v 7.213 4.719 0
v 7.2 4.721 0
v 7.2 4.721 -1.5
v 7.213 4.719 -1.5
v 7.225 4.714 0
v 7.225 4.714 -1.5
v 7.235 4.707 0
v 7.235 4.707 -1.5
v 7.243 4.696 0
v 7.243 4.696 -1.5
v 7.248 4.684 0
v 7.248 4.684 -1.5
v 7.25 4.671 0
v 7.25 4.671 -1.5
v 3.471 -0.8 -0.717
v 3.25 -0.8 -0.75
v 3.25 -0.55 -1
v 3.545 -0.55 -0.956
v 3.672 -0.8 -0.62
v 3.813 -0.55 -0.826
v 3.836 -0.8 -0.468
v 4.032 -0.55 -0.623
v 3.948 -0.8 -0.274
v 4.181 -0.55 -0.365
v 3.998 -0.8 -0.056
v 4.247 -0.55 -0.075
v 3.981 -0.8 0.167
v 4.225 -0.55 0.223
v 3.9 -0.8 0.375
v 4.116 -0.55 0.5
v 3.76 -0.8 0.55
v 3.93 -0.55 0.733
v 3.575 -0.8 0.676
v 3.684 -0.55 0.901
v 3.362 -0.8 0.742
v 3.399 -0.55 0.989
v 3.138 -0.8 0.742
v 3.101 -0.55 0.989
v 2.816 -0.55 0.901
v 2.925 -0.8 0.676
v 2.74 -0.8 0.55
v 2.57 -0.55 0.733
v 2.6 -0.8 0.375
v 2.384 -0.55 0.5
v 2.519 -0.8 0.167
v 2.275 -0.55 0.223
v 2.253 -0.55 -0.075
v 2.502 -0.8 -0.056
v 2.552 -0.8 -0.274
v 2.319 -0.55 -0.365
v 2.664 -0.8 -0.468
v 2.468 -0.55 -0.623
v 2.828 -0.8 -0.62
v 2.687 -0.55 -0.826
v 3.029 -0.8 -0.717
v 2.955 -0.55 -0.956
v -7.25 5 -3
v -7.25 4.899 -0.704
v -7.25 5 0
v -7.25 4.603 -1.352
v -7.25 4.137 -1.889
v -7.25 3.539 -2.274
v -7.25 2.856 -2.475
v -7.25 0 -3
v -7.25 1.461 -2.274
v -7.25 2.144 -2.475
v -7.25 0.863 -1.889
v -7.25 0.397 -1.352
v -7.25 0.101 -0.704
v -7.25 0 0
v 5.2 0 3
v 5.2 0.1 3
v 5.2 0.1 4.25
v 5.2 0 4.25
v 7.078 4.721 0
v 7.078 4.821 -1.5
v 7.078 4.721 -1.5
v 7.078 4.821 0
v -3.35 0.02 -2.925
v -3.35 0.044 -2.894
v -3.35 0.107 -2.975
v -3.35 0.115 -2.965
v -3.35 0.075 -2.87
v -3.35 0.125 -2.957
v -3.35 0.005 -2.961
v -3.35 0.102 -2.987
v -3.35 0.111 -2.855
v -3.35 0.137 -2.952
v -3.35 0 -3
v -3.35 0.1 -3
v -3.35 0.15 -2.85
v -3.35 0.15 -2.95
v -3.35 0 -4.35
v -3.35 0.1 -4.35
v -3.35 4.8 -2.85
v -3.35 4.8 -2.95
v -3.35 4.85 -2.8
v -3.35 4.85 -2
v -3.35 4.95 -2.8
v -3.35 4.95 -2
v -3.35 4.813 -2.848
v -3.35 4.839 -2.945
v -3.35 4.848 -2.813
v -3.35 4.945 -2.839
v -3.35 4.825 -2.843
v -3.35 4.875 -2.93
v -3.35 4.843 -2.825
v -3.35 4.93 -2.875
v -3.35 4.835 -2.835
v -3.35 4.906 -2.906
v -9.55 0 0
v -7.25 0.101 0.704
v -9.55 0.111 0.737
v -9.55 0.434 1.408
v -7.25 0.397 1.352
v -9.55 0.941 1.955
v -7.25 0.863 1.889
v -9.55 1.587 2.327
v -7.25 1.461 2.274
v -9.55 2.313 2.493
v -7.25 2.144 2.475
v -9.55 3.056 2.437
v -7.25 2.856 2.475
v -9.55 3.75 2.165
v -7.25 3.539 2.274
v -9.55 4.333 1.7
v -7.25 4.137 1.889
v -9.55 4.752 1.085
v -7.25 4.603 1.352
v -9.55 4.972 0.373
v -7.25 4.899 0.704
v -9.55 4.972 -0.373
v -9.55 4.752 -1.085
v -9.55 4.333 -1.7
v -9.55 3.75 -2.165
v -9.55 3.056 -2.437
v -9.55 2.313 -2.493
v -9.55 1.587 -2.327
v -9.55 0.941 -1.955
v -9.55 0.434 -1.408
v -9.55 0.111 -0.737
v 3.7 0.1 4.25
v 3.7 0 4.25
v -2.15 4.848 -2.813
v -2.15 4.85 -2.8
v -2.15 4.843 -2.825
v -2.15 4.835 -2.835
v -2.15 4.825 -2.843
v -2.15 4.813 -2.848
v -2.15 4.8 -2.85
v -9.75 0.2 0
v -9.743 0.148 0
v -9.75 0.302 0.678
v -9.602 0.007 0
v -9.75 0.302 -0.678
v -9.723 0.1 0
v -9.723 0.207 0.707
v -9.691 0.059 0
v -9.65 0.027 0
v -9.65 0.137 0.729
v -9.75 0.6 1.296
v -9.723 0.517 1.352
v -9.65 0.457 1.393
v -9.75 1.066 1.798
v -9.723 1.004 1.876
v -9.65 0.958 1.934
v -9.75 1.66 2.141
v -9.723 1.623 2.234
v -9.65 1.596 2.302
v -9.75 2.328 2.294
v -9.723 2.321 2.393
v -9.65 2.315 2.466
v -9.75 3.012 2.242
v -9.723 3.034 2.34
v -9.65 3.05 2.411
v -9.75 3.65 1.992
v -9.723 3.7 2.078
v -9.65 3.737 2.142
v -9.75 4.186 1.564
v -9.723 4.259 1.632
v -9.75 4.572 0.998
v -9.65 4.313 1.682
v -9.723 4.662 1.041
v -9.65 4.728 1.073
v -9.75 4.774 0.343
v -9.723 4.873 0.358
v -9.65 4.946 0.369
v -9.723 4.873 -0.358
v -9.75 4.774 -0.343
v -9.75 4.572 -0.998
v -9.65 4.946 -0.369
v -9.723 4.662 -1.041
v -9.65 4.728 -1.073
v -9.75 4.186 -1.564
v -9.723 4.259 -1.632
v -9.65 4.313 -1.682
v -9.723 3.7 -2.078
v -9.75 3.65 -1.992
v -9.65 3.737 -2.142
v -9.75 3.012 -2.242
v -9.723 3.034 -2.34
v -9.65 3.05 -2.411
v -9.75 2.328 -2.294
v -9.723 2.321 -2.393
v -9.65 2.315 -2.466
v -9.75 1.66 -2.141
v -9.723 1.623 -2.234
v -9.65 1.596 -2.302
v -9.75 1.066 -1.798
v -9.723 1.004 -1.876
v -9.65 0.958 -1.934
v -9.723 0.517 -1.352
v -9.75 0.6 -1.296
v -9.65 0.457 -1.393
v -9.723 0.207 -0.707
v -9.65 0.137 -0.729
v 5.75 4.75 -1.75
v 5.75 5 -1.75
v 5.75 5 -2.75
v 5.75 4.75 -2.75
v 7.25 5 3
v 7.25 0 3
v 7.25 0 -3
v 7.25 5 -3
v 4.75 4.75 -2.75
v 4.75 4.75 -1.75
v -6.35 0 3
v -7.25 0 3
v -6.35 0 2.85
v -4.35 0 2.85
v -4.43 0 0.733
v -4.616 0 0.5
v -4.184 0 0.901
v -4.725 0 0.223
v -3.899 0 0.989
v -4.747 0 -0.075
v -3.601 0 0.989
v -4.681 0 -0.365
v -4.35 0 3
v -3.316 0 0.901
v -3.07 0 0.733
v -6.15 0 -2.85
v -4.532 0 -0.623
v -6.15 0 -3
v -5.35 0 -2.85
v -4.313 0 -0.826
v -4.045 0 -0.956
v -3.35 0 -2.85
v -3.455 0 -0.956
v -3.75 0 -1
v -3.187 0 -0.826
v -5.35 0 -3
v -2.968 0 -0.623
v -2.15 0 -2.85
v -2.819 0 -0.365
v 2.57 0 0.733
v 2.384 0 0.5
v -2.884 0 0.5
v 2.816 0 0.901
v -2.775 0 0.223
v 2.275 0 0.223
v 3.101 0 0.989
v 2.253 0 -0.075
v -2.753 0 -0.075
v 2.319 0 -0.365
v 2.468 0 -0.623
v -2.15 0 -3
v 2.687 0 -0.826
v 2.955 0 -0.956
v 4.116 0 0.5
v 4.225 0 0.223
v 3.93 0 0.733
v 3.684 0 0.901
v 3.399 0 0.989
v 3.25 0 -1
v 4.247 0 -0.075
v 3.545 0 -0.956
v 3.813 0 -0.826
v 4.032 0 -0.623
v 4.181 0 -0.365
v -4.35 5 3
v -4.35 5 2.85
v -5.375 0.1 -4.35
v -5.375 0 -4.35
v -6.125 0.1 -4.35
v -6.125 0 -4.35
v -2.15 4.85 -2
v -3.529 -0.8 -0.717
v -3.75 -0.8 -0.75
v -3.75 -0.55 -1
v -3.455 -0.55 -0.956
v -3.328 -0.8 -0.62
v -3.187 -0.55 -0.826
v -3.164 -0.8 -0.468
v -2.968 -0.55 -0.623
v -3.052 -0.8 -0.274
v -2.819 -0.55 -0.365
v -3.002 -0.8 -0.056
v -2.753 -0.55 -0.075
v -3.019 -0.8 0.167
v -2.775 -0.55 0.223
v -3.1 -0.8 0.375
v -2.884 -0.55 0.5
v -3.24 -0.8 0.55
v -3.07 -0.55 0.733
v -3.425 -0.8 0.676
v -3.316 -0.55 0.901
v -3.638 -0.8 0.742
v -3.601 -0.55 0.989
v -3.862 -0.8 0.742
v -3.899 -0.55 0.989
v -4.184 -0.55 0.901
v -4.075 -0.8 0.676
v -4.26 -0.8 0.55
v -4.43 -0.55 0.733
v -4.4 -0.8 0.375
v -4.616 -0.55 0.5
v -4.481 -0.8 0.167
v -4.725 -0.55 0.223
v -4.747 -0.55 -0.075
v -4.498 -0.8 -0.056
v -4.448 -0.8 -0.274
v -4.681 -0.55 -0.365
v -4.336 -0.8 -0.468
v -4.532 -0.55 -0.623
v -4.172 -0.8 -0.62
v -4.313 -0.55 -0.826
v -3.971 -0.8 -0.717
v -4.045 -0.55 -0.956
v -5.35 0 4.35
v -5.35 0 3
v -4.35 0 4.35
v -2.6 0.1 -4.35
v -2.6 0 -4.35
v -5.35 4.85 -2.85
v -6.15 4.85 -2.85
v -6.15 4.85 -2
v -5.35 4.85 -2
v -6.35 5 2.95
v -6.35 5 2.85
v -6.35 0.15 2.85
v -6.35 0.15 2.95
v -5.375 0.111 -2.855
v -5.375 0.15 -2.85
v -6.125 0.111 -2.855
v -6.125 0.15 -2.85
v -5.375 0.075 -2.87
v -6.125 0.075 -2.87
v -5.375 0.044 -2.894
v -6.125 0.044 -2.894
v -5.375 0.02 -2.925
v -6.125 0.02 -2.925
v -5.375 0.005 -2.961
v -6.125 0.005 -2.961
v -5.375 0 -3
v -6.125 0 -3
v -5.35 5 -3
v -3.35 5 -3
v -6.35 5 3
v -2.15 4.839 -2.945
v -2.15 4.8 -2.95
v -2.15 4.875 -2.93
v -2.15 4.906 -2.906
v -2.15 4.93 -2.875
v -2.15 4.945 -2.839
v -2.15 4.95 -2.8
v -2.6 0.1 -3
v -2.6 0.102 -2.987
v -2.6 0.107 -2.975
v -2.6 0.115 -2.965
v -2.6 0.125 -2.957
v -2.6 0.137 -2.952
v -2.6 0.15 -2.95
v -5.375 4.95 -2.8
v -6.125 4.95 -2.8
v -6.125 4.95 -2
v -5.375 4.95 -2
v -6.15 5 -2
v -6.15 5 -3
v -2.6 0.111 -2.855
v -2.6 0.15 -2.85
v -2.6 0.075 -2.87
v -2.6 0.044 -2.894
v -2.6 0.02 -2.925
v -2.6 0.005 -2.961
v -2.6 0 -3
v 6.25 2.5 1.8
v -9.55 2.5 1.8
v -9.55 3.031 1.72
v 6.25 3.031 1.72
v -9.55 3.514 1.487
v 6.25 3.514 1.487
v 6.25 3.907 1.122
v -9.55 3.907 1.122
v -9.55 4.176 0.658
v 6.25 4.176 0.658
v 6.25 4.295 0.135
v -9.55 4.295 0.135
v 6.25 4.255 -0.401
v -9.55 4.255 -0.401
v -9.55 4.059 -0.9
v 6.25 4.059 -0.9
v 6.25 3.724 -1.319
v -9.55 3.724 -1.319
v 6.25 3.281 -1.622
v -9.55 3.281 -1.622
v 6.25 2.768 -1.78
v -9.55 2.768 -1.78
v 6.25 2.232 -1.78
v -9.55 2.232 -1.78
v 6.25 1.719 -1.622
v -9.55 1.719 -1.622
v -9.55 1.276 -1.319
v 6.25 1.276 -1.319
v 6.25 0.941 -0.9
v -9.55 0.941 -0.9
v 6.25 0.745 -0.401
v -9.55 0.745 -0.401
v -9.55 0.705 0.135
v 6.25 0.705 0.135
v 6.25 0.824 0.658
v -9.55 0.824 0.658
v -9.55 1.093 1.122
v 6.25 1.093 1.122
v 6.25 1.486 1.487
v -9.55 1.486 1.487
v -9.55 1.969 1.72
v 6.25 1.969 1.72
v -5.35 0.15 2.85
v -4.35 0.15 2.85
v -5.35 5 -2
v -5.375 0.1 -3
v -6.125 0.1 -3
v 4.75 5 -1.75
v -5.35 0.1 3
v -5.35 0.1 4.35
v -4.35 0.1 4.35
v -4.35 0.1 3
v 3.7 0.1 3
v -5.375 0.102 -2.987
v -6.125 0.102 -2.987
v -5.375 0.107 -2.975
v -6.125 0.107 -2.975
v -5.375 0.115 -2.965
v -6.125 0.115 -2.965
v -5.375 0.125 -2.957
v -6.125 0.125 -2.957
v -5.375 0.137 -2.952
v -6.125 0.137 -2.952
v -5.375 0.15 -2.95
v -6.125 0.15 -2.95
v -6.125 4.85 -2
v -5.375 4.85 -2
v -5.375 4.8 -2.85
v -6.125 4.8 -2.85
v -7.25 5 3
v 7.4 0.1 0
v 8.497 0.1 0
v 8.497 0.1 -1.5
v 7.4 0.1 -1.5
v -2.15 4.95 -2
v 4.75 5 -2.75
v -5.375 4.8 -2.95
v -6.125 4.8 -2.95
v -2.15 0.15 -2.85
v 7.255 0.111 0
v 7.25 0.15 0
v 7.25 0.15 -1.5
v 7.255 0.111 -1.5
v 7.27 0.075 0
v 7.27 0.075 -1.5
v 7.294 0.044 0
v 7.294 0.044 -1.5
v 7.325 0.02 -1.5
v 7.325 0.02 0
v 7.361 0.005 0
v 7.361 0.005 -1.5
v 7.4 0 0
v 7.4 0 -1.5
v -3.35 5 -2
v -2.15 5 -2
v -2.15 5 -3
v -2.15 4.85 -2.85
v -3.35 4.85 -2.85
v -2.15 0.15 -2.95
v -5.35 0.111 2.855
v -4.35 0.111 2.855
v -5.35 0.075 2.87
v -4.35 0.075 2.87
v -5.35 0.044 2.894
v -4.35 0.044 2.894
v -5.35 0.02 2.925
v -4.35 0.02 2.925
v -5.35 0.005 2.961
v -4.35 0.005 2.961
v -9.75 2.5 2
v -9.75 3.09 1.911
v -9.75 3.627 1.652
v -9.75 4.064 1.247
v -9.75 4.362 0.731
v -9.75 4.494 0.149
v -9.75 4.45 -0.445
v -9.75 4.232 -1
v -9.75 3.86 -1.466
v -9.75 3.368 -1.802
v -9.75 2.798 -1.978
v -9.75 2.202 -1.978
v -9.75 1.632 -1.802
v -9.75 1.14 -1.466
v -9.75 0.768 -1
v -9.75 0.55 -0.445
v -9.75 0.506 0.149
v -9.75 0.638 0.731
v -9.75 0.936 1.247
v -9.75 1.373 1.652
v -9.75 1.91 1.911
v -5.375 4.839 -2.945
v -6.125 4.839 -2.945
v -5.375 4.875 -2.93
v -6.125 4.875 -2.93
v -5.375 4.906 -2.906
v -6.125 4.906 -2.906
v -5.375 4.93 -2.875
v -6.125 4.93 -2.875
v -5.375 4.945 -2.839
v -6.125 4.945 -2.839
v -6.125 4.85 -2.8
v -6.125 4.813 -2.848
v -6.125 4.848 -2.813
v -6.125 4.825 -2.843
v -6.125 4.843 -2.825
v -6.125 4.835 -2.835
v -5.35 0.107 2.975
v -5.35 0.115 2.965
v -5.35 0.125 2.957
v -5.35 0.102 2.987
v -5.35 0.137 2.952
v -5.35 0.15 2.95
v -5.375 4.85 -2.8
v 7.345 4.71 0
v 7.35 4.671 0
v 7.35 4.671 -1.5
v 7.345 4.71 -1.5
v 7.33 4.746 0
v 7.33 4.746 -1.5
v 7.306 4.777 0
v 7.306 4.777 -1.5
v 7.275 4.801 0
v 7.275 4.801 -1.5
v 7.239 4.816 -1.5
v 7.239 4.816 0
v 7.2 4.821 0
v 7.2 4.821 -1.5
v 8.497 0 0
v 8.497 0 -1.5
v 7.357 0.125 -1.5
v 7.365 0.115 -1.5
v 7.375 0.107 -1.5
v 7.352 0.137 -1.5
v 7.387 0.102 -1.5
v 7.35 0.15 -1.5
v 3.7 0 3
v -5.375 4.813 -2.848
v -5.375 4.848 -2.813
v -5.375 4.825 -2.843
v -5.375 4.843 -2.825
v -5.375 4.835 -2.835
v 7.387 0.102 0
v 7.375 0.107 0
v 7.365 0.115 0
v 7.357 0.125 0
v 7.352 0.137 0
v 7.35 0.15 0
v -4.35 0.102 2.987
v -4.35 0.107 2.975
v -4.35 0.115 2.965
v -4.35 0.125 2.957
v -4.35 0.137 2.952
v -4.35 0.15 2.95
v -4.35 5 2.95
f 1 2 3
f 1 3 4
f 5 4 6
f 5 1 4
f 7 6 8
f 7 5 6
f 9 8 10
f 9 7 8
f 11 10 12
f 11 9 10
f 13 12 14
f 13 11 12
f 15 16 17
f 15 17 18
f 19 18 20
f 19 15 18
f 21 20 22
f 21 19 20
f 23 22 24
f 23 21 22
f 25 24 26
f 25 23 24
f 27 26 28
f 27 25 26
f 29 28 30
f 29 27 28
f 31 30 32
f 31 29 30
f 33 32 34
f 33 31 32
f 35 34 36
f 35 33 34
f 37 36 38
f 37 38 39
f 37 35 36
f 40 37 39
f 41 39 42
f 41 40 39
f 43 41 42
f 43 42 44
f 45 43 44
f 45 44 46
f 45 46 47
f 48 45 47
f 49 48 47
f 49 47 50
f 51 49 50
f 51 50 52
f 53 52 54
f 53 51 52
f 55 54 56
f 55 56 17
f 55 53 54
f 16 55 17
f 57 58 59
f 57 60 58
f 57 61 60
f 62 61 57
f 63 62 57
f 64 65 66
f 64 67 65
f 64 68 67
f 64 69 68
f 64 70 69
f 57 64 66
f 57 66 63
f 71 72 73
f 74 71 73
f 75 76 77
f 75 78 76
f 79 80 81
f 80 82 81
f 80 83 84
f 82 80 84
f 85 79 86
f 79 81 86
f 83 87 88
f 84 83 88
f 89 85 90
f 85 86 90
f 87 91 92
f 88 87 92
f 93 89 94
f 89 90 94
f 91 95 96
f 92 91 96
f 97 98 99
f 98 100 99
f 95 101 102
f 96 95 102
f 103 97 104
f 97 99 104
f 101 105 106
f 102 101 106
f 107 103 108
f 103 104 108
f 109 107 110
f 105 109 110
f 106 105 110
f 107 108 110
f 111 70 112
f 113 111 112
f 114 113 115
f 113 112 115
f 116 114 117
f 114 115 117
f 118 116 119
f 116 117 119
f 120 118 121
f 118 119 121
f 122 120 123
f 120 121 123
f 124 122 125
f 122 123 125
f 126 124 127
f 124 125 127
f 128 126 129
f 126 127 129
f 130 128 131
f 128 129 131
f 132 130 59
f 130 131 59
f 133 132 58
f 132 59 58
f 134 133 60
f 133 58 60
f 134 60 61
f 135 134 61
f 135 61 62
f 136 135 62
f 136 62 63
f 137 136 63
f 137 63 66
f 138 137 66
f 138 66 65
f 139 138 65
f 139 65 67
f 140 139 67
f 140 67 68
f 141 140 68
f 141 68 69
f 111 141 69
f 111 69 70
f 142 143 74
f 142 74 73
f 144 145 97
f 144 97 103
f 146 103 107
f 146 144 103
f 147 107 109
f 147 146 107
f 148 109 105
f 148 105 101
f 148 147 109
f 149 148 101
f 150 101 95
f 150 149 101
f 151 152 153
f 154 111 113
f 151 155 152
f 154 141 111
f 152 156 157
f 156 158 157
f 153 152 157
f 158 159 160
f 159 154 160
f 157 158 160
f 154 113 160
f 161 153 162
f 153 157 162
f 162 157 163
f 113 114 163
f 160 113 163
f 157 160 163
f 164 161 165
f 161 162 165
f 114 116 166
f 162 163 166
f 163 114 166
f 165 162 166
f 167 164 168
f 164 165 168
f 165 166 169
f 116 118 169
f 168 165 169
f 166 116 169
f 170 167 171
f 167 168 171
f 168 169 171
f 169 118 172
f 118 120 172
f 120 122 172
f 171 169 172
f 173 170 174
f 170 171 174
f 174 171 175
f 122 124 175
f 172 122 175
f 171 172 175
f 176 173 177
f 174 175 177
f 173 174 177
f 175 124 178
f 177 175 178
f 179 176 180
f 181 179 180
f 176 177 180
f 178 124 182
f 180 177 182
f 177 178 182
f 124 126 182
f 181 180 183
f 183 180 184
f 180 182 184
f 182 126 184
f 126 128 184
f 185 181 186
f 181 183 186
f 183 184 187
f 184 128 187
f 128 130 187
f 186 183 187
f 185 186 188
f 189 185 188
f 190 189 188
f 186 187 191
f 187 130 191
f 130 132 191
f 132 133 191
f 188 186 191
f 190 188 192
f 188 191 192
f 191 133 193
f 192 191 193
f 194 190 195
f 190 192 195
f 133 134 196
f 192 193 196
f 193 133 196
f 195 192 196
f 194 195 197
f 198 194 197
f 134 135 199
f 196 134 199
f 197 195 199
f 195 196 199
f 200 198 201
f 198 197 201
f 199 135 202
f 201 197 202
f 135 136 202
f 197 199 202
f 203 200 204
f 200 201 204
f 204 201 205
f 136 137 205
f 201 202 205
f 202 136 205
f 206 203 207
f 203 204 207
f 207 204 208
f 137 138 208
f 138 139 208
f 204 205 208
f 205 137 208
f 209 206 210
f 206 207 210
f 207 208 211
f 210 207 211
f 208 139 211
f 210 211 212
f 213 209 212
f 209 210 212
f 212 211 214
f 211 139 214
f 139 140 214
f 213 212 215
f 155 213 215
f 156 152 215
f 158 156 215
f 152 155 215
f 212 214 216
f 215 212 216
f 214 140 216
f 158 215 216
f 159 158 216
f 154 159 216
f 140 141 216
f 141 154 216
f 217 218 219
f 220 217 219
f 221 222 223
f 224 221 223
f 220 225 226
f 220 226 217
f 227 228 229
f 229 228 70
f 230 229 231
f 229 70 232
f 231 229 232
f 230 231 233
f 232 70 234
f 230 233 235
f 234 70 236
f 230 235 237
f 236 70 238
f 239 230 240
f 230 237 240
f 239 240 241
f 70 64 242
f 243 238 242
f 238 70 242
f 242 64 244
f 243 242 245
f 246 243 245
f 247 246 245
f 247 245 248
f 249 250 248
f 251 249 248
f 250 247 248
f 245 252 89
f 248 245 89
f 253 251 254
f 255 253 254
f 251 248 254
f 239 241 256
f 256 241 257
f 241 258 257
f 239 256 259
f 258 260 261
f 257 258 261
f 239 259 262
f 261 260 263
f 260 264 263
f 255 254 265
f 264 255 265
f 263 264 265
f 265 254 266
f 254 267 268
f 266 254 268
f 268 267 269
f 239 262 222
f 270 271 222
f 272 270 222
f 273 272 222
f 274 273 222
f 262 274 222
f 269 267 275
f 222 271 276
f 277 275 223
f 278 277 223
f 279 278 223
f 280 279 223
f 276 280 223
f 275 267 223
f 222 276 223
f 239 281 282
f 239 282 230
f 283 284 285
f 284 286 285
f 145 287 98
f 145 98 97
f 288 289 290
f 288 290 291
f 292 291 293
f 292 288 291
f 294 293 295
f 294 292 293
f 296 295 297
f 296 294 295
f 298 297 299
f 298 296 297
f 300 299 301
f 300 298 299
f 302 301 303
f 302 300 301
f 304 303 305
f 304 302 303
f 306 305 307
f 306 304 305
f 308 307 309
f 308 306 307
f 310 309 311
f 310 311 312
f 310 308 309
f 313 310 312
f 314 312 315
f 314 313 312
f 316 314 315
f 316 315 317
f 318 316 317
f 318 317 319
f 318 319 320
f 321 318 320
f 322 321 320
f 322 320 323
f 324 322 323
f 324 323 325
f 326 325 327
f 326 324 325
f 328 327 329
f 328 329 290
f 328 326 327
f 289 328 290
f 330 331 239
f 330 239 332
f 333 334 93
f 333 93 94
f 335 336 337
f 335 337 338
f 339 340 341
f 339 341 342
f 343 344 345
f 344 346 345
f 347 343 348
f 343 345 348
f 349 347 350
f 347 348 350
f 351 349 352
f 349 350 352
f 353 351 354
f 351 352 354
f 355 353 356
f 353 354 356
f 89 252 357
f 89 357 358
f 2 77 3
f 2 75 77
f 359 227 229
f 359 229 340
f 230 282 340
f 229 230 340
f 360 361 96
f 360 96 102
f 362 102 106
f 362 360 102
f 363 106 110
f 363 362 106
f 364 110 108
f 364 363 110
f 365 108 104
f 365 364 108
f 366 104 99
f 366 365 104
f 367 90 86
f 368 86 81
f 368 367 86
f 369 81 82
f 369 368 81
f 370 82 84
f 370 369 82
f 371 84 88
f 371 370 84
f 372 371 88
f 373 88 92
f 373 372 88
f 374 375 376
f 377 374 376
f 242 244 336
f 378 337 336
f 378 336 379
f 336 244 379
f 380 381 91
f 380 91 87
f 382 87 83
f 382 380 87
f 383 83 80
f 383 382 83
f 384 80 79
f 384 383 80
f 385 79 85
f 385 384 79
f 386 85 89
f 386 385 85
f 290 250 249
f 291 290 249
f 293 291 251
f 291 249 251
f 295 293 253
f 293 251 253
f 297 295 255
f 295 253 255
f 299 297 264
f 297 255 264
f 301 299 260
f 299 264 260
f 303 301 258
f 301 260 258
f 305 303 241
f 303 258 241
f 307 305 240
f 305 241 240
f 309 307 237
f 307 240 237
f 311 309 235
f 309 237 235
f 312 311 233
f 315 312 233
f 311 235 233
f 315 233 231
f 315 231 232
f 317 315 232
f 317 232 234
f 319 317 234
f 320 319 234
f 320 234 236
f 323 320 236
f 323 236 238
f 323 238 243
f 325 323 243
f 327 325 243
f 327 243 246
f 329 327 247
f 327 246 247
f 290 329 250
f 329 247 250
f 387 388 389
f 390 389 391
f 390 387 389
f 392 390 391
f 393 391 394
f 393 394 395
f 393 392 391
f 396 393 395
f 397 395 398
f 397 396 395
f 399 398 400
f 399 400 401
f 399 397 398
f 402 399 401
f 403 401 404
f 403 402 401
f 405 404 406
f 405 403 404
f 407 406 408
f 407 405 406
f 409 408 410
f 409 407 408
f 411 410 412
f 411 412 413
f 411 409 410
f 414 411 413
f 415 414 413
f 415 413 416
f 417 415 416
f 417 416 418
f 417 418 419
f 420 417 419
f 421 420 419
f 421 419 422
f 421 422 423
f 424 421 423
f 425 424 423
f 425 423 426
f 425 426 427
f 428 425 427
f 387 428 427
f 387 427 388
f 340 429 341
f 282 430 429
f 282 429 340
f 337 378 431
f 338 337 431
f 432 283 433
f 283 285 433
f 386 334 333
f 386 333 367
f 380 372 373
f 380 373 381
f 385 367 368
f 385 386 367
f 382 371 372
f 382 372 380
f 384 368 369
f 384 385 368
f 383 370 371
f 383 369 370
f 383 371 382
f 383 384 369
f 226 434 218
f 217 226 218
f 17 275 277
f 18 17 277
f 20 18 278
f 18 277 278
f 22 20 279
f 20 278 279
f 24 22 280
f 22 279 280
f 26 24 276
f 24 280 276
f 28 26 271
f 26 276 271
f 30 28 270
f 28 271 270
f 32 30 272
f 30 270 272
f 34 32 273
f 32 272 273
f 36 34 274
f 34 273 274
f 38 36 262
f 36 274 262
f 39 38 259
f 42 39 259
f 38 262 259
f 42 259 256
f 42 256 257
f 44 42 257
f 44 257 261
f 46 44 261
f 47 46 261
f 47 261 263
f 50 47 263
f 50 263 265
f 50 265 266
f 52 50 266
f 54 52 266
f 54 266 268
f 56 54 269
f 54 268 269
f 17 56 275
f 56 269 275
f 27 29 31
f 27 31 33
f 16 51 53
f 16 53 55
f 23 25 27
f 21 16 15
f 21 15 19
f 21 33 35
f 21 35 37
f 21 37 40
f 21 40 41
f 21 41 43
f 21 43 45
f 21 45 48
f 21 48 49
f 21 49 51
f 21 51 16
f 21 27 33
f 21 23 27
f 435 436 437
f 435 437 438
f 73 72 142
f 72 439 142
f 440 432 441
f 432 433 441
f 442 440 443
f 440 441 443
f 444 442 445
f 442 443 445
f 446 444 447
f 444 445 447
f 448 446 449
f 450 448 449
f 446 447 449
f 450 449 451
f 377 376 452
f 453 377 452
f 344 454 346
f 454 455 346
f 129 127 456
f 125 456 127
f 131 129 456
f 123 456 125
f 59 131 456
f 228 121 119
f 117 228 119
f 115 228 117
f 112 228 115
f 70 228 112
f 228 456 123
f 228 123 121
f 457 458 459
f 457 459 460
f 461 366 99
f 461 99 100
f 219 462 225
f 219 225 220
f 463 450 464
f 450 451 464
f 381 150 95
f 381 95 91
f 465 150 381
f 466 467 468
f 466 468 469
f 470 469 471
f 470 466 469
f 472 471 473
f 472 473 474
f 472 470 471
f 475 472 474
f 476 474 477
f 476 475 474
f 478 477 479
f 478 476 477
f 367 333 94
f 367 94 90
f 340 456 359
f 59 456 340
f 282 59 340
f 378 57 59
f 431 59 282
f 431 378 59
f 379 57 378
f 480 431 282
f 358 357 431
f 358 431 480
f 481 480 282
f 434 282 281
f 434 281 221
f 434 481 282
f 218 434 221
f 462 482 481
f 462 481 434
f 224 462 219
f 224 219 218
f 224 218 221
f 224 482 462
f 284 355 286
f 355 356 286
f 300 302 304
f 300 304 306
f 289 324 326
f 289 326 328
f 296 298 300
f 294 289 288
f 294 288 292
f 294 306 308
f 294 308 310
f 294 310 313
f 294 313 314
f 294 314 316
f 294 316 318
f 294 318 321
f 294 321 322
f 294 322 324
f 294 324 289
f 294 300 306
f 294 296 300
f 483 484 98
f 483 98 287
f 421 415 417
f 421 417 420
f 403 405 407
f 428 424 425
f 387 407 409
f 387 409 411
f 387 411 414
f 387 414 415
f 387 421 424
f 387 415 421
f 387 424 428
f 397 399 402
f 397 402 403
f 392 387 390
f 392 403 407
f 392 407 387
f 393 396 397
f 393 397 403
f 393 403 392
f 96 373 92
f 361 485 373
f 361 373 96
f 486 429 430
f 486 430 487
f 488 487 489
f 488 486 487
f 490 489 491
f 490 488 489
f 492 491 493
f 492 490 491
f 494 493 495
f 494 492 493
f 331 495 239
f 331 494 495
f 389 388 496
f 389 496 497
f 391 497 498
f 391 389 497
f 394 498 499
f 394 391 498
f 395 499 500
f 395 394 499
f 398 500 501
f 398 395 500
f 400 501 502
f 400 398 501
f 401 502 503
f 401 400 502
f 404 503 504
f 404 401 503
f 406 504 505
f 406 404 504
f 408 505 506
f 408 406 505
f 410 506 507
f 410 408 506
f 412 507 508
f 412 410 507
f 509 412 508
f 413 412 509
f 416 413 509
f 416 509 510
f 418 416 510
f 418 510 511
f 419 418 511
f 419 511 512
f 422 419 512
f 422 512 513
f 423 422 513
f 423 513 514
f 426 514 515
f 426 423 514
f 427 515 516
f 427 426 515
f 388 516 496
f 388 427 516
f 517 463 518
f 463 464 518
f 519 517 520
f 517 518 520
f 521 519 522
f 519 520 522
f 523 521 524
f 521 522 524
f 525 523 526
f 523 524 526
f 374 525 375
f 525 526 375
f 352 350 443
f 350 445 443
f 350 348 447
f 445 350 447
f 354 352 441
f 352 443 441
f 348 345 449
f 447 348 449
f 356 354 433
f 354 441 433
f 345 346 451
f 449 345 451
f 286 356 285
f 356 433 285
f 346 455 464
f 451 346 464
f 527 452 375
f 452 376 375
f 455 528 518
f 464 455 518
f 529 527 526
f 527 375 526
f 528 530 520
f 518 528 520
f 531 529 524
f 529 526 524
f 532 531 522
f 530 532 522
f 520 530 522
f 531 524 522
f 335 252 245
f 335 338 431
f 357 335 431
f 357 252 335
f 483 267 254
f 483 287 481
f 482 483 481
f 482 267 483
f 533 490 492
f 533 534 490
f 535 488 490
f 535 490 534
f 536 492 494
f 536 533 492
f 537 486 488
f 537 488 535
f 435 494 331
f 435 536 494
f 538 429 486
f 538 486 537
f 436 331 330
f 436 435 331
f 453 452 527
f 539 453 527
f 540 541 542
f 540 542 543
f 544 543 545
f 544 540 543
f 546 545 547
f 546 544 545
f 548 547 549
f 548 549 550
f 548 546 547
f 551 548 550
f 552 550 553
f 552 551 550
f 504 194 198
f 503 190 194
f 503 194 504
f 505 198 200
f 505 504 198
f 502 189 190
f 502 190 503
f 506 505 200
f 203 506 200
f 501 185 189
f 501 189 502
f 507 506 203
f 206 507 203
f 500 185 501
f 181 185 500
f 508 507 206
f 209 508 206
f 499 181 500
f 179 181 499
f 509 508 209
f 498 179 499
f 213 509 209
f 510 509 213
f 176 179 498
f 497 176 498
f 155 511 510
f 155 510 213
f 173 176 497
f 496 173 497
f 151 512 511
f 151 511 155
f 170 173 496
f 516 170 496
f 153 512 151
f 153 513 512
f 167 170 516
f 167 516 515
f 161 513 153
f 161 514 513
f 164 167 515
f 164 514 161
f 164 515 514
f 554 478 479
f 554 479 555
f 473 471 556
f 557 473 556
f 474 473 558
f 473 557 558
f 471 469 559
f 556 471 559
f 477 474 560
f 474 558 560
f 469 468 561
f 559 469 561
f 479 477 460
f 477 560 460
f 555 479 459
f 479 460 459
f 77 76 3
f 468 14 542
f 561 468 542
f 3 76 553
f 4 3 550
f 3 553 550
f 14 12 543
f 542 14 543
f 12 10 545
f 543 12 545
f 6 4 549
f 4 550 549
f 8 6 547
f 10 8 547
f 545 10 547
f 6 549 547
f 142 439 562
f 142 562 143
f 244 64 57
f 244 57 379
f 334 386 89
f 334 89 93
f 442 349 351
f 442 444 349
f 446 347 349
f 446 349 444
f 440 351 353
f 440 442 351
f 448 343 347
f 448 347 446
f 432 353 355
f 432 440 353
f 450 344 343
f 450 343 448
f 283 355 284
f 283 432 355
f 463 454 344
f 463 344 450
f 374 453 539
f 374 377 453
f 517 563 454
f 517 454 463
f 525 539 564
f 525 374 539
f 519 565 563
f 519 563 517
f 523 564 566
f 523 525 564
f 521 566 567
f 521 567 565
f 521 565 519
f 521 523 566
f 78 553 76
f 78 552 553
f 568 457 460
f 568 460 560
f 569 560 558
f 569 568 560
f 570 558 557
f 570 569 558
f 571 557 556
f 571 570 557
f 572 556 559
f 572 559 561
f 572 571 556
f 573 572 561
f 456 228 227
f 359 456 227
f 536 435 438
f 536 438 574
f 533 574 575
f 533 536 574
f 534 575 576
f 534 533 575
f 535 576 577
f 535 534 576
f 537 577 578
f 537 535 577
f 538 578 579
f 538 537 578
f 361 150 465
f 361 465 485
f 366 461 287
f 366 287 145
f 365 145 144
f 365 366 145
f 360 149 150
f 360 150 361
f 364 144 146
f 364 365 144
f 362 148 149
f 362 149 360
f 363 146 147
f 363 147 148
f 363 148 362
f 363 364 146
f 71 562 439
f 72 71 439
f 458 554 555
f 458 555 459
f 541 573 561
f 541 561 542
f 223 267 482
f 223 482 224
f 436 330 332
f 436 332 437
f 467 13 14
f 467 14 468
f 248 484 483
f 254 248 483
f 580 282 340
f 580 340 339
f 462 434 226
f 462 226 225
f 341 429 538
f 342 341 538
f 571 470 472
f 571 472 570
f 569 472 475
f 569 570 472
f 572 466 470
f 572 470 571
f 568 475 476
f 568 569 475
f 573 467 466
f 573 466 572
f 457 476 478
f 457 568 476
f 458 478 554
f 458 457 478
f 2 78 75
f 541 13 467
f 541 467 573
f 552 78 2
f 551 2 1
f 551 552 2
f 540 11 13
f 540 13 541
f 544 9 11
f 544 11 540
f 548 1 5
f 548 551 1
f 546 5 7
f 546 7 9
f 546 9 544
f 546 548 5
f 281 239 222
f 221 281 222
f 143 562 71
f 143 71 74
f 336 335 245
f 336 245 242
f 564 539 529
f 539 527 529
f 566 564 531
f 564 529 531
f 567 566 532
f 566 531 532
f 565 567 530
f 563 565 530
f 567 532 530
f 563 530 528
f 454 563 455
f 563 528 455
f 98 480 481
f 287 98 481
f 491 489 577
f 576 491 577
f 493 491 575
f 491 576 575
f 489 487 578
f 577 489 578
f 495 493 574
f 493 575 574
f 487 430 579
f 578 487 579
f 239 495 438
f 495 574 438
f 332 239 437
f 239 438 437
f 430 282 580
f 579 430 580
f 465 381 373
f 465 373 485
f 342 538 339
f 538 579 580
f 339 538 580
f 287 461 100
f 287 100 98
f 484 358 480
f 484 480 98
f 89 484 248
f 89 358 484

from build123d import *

# Parameters (mm, degrees)
SKETCH1_W               = 14.5
SKETCH1_H               = 6
BOSS_EXTRUDE1_DEPTH     = 5
SKETCH2_R               = 2.5
SKETCH2_R_2             = 1.8
BOSS_EXTRUDE2_DEPTH     = 2.5
CUT_EXTRUDE1_START      = -13.5
SKETCH2_2_R             = 1.8
CUT_EXTRUDE1_DEPTH      = 13.5
SKETCH3_W               = 1
SKETCH3_H               = 1
CUT_EXTRUDE2_DEPTH      = 0.25
BASE_FLANGE1_DEPTH      = 0.75
SKETCH9_W               = 1.25
SKETCH9_H               = 0.1
BASE_FLANGE2_DEPTH      = 0.75
CUT_EXTRUDE3_DEPTH      = 0.15
BASE_FLANGE3_DEPTH      = 0.5
SKETCH17_W              = 0.1
SKETCH17_H              = 4.85
BOSS_EXTRUDE3_DEPTH     = 1
SKETCH20_W              = 0.8
SKETCH20_H              = 1
CUT_EXTRUDE4_DEPTH      = 0.15
SKETCH21_W              = 0.8
SKETCH21_H              = 5
CUT_EXTRUDE5_DEPTH      = 0.15
BASE_FLANGE4_DEPTH      = 0.375
CUT_EXTRUDE6_DEPTH      = 0.15
SKETCH27_W              = 1.2
SKETCH27_H              = 1
CUT_EXTRUDE7_DEPTH      = 0.15
BASE_FLANGE5_DEPTH      = 0.4
BASE_FLANGE5_DEPTH_BACK = 0.8
SKETCH31_W              = 0.45
SKETCH31_H              = 1.5
CUT_EXTRUDE8_DEPTH      = 0.15
CHAMFER1_SIZE           = 0.2
FILLET1_R               = 0.2
SKETCH33_R              = 1
BOSS_EXTRUDE4_DEPTH     = 0.8
CHAMFER2_SIZE           = 0.25


# Sheet-metal steps are written as plain solids
with BuildPart() as part:
    # Sketch1 → Boss-Extrude1 (new body)
    with BuildSketch(Plane(origin=(0, 0, 0), x_dir=(1, 0, 0), z_dir=(0, 1, 0))):
        Rectangle(SKETCH1_W, SKETCH1_H)
    extrude(amount=BOSS_EXTRUDE1_DEPTH)

    # Sketch2 → Boss-Extrude2 (add)
    with BuildSketch(Plane.ZY.offset(7.25)):
        with Locations(Location((0, 2.5, 0), (0, 0, 270))):
            Circle(SKETCH2_R)
        with Locations((0, 2.5)):
            Circle(SKETCH2_R_2, mode=Mode.SUBTRACT)
    extrude(amount=BOSS_EXTRUDE2_DEPTH)

    # Sketch2<2> → Cut-Extrude1 (cut)
    with BuildSketch(Plane.ZY.offset(7.25).offset(CUT_EXTRUDE1_START)):
        with Locations((0, 2.5)):
            Circle(SKETCH2_2_R)
    extrude(amount=CUT_EXTRUDE1_DEPTH, mode=Mode.SUBTRACT)

    # Sketch3 → Cut-Extrude2 (cut)
    with BuildSketch(Plane(origin=(0, 5, 0), x_dir=(1, 0, 0), z_dir=(0, 1, 0))):
        with Locations((5.25, 2.25)):
            Rectangle(SKETCH3_W, SKETCH3_H)
    extrude(amount=-CUT_EXTRUDE2_DEPTH, mode=Mode.SUBTRACT)

    # Sketch13 → Cut-Extrude3 (cut)
    with BuildSketch(Plane.XY.offset(3)):
        Polygon((-6.35, 5), (-4.85, 5), (-4.35, 5), (-4.35, 0), (-4.85, 0), (-6.35, 0), align=None)
    extrude(amount=-CUT_EXTRUDE3_DEPTH, mode=Mode.SUBTRACT)

    # Sketch20 → Cut-Extrude4 (cut)
    with BuildSketch(Plane(origin=(0, 5, 0), x_dir=(1, 0, 0), z_dir=(0, 1, 0))):
        with Locations((-5.75, 2.5)):
            Rectangle(SKETCH20_W, SKETCH20_H)
    extrude(amount=-CUT_EXTRUDE4_DEPTH, mode=Mode.SUBTRACT)

    # Sketch21 → Cut-Extrude5 (cut)
    with BuildSketch(Plane(origin=(0, 0, -3), x_dir=(-1, 0, 0), z_dir=(0, 0, -1))):
        with Locations((5.75, 2.5)):
            Rectangle(SKETCH21_W, SKETCH21_H)
    extrude(amount=-CUT_EXTRUDE5_DEPTH, mode=Mode.SUBTRACT)

    # Sketch26 → Cut-Extrude6 (cut)
    with BuildSketch(Plane(origin=(0, 0, -3), x_dir=(-1, 0, 0), z_dir=(0, 0, -1))):
        Polygon((2.95, 5), (3.35, 5), (3.35, 0), (2.95, 0), (2.15, 0), (2.15, 5), align=None)
    extrude(amount=-CUT_EXTRUDE6_DEPTH, mode=Mode.SUBTRACT)

    # Sketch27 → Cut-Extrude7 (cut)
    with BuildSketch(Plane(origin=(0, 5, 0), x_dir=(1, 0, 0), z_dir=(0, 1, 0))):
        with Locations((-2.75, 2.5)):
            Rectangle(SKETCH27_W, SKETCH27_H)
    extrude(amount=-CUT_EXTRUDE7_DEPTH, mode=Mode.SUBTRACT)

    # Chamfer1
    chamfer1_edges = [part.edges().sort_by_distance(p)[0] for p in [
        (-9.75, 2.5, -1.8),
    ]]
    chamfer(chamfer1_edges, length=CHAMFER1_SIZE)

    # Fillet1
    fillet1_edges = [part.edges().sort_by_distance(p)[0] for p in [
        (-9.75, 5, 0),
    ]]
    fillet(fillet1_edges, radius=FILLET1_R)

    # Sketch33 → Boss-Extrude4 (add)
    with BuildSketch(Plane.XZ):
        with Locations(Location((-3.75, 0, 0), (0, 0, 270))):
            Circle(SKETCH33_R)
        with Locations(Location((3.25, 0, 0), (0, 0, 270))):
            Circle(SKETCH33_R)
    extrude(amount=BOSS_EXTRUDE4_DEPTH)

    # Chamfer2
    chamfer2_edges = [part.edges().sort_by_distance(p)[0] for p in [
        (-3.75, -0.8, 1),
        (3.25, -0.8, 1),
    ]]
    chamfer(chamfer2_edges, length=CHAMFER2_SIZE)


with BuildPart() as body_2:
    # Sketch4 → Base-Flange1 (new, symmetric)
    with BuildSketch(Plane.XY.offset(-0.75)):
        with BuildLine():
            Line((7.077702631, 4.721178133), (7.2, 4.721178133))
            ThreePointArc((7.2, 4.721178133), (7.235355339, 4.706533472), (7.25, 4.671178133))
            Line((7.25, 4.671178133), (7.25, 0.15))
            ThreePointArc((7.25, 0.15), (7.293933983, 0.043933983), (7.4, 0))
            Line((7.4, 0), (8.496675231, 0))
            Line((8.496675231, 0), (8.496675231, 0.1))
            Line((8.496675231, 0.1), (7.4, 0.1))
            ThreePointArc((7.4, 0.1), (7.364644661, 0.114644661), (7.35, 0.15))
            Line((7.35, 0.15), (7.35, 4.671178133))
            ThreePointArc((7.35, 4.671178133), (7.306066017, 4.77724415), (7.2, 4.821178133))
            Line((7.2, 4.821178133), (7.077702631, 4.821178133))
            Line((7.077702631, 4.821178133), (7.077702631, 4.721178133))
        make_face()
    extrude(amount=BASE_FLANGE1_DEPTH, both=True)


with BuildPart() as body_3:
    # Sketch9 → Base-Flange2 (new, symmetric)
    with BuildSketch(Plane.ZY.offset(-4.45)):
        with Locations((3.625, 0.05)):
            Rectangle(SKETCH9_W, SKETCH9_H)
    extrude(amount=BASE_FLANGE2_DEPTH, both=True)


with BuildPart() as body_4:
    # Sketch14 → Base-Flange3 (new, symmetric)
    with BuildSketch(Plane.ZY.offset(4.85)):
        with BuildLine():
            Line((2.85, 5), (2.85, 0.15))
            ThreePointArc((2.85, 0.15), (2.893933983, 0.043933983), (3, 0))
            Line((3, 0), (4.35, 0))
            Line((4.35, 0), (4.35, 0.1))
            Line((4.35, 0.1), (3, 0.1))
            ThreePointArc((3, 0.1), (2.964644661, 0.114644661), (2.95, 0.15))
            Line((2.95, 0.15), (2.95, 5))
            Line((2.95, 5), (2.85, 5))
        make_face()
    extrude(amount=BASE_FLANGE3_DEPTH, both=True)

    # Sketch17 → Boss-Extrude3 (add)
    with BuildSketch(Plane.ZY.offset(5.35)):
        with Locations((2.9, 2.575)):
            Rectangle(SKETCH17_W, SKETCH17_H)
    extrude(amount=BOSS_EXTRUDE3_DEPTH)


with BuildPart() as body_5:
    # Sketch22 → Base-Flange4 (new, symmetric)
    with BuildSketch(Plane.ZY.offset(5.75)):
        with BuildLine():
            Line((-2, 4.85), (-2.8, 4.85))
            ThreePointArc((-2.8, 4.85), (-2.835355339, 4.835355339), (-2.85, 4.8))
            Line((-2.85, 4.8), (-2.85, 0.15))
            ThreePointArc((-2.85, 0.15), (-2.893933983, 0.043933983), (-3, 0))
            Line((-3, 0), (-4.35, 0))
            Line((-4.35, 0), (-4.35, 0.1))
            Line((-4.35, 0.1), (-3, 0.1))
            ThreePointArc((-3, 0.1), (-2.964644661, 0.114644661), (-2.95, 0.15))
            Line((-2.95, 0.15), (-2.95, 4.8))
            ThreePointArc((-2.95, 4.8), (-2.906066017, 4.906066017), (-2.8, 4.95))
            Line((-2.8, 4.95), (-2, 4.95))
            Line((-2, 4.95), (-2, 4.85))
        make_face()
    extrude(amount=BASE_FLANGE4_DEPTH, both=True)


with BuildPart() as body_6:
    # Sketch28 → Base-Flange5 (new, two sides: drawn at the far end of the back side and taken through both)
    with BuildSketch(Plane.ZY.offset(2.95).offset(-BASE_FLANGE5_DEPTH_BACK)):
        with BuildLine():
            Line((-2, 4.85), (-2.8, 4.85))
            ThreePointArc((-2.8, 4.85), (-2.835355339, 4.835355339), (-2.85, 4.8))
            Line((-2.85, 4.8), (-2.85, 0.15))
            ThreePointArc((-2.85, 0.15), (-2.893933983, 0.043933983), (-3, 0))
            Line((-3, 0), (-4.35, 0))
            Line((-4.35, 0), (-4.35, 0.1))
            Line((-4.35, 0.1), (-3, 0.1))
            ThreePointArc((-3, 0.1), (-2.964644661, 0.114644661), (-2.95, 0.15))
            Line((-2.95, 0.15), (-2.95, 4.8))
            ThreePointArc((-2.95, 4.8), (-2.906066017, 4.906066017), (-2.8, 4.95))
            Line((-2.8, 4.95), (-2, 4.95))
            Line((-2, 4.95), (-2, 4.85))
        make_face()
    extrude(amount=BASE_FLANGE5_DEPTH + BASE_FLANGE5_DEPTH_BACK)

    # Sketch31 → Cut-Extrude8 (cut)
    with BuildSketch(Plane.XZ):
        with Locations((-2.375, -3.6)):
            Rectangle(SKETCH31_W, SKETCH31_H)
    extrude(amount=-CUT_EXTRUDE8_DEPTH, mode=Mode.SUBTRACT)


solid = Compound([part.part, body_2.part, body_3.part, body_4.part, body_5.part, body_6.part])
